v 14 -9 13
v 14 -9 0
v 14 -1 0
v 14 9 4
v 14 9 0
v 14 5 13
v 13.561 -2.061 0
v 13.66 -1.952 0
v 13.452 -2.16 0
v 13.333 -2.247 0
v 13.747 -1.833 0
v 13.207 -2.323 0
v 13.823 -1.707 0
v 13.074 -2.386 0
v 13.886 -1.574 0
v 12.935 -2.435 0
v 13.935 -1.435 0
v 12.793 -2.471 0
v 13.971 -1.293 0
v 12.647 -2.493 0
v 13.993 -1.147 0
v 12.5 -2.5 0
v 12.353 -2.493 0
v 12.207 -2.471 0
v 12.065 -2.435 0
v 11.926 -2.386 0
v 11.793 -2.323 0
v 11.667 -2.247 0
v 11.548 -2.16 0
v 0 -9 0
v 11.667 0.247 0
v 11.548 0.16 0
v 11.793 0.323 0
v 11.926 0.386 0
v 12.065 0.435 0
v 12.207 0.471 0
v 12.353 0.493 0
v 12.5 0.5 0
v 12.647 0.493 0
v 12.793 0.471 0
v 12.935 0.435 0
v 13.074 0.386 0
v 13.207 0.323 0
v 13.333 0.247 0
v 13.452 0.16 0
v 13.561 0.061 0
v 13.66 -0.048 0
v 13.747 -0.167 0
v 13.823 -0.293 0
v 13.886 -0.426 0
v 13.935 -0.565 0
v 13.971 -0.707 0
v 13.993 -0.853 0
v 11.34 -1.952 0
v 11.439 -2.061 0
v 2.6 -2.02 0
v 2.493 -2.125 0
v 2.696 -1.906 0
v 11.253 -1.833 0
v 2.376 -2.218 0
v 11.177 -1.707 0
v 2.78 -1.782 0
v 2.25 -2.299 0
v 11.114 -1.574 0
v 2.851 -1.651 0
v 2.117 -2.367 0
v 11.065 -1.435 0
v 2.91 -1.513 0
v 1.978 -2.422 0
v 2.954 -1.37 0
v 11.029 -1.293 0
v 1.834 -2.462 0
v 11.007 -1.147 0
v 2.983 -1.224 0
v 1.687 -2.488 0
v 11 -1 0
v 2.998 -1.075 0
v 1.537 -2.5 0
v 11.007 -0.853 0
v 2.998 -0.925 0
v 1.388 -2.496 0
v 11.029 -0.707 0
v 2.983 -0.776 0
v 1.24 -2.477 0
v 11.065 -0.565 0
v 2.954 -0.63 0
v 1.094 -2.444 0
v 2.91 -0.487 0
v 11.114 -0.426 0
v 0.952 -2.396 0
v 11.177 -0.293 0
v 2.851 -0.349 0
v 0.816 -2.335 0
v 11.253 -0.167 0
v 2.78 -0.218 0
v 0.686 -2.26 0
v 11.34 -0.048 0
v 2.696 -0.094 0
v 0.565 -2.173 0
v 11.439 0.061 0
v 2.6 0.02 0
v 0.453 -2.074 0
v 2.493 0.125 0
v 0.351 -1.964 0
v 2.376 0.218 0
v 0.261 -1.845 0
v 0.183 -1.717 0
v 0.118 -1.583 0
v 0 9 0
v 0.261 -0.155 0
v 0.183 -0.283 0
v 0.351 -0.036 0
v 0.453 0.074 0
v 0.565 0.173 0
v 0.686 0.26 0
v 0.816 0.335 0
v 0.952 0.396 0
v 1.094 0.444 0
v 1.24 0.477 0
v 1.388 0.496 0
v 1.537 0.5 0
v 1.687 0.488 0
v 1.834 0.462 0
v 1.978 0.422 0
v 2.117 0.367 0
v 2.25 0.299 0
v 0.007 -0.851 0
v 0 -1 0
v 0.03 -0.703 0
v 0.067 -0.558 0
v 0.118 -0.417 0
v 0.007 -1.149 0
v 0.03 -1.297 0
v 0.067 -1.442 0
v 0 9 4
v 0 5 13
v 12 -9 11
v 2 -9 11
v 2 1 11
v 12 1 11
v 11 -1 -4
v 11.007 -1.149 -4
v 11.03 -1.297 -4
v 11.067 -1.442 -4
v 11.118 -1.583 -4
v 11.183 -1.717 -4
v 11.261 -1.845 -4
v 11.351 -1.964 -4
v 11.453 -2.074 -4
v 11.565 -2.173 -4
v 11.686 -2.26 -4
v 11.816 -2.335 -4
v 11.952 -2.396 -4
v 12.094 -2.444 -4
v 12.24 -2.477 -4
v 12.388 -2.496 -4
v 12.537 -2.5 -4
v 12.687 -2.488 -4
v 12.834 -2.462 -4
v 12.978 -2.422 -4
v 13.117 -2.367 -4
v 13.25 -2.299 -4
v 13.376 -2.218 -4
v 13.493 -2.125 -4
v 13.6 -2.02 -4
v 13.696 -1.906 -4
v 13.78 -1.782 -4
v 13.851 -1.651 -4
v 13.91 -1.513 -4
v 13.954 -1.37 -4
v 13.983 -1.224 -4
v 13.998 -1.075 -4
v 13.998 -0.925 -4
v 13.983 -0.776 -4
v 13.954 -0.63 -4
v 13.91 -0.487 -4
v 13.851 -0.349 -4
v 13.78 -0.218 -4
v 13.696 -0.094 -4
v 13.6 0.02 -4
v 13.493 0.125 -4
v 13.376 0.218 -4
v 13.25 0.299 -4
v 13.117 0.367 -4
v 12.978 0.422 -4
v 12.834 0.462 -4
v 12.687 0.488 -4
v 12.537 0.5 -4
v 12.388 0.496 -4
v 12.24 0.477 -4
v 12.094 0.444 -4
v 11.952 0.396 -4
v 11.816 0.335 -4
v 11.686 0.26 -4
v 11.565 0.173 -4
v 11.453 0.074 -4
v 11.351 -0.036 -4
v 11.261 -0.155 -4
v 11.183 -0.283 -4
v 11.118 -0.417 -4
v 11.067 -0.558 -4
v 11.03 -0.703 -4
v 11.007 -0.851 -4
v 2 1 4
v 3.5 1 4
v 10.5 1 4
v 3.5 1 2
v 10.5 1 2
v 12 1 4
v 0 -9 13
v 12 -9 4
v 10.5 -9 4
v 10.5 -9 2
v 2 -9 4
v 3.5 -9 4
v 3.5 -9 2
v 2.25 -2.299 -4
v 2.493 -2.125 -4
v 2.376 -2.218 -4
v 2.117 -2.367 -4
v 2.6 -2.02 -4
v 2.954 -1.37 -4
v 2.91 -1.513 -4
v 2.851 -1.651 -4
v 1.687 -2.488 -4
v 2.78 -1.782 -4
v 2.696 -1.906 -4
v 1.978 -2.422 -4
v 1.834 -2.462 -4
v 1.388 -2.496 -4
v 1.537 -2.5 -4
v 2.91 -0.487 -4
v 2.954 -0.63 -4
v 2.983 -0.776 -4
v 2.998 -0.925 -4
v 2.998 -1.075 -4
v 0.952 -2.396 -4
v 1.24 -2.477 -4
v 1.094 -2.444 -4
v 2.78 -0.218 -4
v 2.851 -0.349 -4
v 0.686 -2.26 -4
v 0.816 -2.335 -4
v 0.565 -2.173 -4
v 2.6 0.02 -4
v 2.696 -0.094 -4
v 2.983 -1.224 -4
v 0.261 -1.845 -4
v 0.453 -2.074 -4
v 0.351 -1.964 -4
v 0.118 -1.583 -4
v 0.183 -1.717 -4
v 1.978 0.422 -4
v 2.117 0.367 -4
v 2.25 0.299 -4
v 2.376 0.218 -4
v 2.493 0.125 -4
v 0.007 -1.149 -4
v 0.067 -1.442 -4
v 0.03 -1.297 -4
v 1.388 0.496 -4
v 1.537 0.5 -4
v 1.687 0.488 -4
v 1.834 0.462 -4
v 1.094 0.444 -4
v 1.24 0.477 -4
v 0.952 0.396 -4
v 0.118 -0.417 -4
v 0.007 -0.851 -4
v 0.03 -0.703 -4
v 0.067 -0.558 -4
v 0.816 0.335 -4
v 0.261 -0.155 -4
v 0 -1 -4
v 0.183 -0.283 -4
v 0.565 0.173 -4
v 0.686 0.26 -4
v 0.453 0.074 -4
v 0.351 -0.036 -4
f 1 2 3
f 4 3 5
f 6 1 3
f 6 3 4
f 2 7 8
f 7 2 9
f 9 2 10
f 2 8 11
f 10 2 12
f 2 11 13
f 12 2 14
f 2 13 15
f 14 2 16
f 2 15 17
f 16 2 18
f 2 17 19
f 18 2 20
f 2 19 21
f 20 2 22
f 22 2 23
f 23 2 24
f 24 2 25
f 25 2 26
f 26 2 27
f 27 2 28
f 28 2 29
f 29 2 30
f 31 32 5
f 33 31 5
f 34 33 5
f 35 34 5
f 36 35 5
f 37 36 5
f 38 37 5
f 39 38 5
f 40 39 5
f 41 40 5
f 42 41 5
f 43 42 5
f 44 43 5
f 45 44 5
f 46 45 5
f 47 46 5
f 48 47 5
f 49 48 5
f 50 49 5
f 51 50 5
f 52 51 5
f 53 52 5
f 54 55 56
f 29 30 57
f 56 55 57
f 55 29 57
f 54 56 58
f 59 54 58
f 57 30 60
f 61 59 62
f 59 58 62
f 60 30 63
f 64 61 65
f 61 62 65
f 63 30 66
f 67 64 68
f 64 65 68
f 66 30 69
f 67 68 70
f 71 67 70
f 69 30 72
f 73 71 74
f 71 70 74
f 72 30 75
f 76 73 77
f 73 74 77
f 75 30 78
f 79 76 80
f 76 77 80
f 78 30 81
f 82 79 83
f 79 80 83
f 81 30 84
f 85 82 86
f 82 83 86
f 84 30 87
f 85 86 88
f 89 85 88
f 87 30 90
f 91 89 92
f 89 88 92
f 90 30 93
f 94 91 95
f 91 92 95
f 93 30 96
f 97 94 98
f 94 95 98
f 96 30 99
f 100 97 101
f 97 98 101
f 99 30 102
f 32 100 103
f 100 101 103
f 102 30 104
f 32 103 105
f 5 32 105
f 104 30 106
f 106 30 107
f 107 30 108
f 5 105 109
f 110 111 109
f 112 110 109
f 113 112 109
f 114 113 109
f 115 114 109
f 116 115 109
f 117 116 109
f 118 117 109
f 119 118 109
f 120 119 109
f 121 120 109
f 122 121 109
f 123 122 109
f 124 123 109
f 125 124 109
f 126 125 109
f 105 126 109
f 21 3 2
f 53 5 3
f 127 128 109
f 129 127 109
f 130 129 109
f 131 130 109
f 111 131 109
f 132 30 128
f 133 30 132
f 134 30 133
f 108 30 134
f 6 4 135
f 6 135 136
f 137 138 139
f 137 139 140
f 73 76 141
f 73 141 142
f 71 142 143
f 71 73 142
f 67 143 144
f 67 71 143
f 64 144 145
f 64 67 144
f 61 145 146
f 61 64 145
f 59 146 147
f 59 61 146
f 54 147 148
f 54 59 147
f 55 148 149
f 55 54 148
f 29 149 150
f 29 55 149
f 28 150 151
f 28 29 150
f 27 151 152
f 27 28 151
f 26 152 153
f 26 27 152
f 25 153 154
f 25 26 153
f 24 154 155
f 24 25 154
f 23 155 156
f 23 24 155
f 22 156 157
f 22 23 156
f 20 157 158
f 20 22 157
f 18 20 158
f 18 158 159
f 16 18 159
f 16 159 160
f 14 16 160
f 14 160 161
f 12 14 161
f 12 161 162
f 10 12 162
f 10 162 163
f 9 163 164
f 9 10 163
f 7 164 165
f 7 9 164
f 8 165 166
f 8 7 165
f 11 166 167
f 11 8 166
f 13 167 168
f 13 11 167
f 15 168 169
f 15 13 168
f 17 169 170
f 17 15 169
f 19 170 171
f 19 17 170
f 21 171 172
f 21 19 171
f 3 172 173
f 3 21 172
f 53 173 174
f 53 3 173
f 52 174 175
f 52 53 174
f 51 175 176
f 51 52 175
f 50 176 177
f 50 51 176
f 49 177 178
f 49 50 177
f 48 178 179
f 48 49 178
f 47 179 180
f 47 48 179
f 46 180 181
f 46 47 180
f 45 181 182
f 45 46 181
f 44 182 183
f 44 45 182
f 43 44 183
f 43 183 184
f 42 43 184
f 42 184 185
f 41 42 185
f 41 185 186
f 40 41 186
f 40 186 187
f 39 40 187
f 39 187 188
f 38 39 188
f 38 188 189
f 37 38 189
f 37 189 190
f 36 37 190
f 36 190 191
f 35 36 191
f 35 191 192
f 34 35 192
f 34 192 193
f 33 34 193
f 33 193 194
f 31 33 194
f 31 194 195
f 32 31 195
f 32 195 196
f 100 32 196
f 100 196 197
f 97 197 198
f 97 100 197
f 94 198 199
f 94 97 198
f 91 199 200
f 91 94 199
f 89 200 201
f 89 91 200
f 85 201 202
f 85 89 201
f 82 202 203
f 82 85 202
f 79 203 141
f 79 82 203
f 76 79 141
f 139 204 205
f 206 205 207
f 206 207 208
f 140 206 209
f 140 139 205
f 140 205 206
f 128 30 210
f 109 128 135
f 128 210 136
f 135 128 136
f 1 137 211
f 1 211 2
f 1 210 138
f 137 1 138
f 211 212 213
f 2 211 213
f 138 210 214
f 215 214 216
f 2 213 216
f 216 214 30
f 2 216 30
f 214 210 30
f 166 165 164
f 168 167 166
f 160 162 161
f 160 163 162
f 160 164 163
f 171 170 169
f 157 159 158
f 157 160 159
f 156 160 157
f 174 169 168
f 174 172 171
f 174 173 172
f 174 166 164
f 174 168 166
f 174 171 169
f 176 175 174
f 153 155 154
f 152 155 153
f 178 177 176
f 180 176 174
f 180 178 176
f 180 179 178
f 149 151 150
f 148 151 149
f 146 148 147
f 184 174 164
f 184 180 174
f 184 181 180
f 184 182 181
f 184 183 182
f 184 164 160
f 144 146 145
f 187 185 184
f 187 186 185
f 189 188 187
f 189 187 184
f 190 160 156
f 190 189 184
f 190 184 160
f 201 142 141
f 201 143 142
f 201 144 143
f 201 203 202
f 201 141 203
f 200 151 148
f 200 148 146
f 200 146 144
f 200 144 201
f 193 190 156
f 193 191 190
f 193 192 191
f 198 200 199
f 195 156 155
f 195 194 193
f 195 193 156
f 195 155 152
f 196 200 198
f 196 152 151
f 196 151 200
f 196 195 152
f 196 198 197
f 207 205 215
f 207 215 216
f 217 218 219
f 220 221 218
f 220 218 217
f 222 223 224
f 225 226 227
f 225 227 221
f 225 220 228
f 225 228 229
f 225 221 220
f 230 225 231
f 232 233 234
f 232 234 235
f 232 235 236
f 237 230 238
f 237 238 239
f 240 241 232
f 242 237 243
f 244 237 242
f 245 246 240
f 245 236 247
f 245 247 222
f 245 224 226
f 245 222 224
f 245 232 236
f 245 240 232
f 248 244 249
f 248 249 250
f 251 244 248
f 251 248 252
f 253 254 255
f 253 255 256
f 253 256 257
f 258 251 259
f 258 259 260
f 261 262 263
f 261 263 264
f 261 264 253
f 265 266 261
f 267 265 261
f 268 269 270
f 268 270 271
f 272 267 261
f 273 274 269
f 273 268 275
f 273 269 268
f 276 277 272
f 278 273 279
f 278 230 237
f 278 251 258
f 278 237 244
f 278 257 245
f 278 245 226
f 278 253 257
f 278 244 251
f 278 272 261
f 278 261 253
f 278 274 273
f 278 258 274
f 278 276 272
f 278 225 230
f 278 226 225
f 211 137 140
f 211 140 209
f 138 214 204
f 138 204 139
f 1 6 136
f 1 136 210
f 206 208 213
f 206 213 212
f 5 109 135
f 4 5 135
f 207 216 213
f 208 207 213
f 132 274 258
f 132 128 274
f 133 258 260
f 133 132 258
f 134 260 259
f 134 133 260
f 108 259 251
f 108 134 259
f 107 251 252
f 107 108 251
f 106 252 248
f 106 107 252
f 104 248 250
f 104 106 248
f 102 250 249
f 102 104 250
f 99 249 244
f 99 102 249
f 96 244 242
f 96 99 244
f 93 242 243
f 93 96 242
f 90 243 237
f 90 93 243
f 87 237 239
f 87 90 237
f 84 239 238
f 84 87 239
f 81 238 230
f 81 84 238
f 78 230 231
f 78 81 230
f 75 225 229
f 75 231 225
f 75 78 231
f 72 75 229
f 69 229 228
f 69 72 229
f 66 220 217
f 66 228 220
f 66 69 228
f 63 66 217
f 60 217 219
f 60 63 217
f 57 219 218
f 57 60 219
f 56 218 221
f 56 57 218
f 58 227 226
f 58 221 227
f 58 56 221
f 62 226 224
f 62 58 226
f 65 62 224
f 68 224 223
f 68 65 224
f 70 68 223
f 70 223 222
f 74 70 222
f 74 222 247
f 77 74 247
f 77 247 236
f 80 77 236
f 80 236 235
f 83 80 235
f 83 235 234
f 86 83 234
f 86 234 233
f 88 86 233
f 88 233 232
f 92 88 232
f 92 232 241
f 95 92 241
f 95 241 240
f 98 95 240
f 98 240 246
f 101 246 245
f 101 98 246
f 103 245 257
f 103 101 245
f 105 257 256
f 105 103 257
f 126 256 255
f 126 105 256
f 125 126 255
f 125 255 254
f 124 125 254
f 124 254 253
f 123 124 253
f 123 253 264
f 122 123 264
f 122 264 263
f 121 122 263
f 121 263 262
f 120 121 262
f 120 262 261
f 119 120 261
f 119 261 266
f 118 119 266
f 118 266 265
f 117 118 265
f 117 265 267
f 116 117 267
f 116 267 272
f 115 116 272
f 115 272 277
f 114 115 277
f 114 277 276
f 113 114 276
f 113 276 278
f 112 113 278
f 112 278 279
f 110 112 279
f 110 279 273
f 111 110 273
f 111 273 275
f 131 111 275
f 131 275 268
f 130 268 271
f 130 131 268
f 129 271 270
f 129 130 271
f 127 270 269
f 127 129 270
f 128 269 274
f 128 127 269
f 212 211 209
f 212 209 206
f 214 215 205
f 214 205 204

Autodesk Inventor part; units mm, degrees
ref_plane "YZ Plane" through (0, 0, 0) normal (1, 0, 0) x (0, 1, 0)
ref_plane "XZ Plane" through (0, 0, 0) normal (0, 1, 0) x (-1, 0, 0)
ref_plane "XY Plane" through (0, 0, 0) normal (0, 0, 1) x (1, 0, 0)
sketch "Sketch1" plane through (0, 0, 0) normal (1, 0, 0) x (0, 1, 0)
  line L0 (-9, 13) -> (-9, 0)
  line L1 (-9, 0) -> (9, 0)
  line L2 (9, 0) -> (9, 4)
  line L3 (9, 4) -> (5, 13)
  line L4 (5, 13) -> (-9, 13)
  point P0 (0, 0)
  dimension "d0" = 13
  dimension "d1" = 18
  dimension "d2" = 9
  dimension "d3" = 0
  dimension "d4" = 4
  dimension "d5" = 14
extrude "Extrusion1" add sketch "Sketch1" along normal blind 14
sketch "Sketch2" plane through (0, -9, 0) normal (0, -1, 0) x (1, 0, 0)
  line L0 (0, 13) -> (0, 0) projected
  line L1 (14, 13) -> (14, 0) projected
  line L2 (0, 13) -> (14, 13) projected
  line L3 (2, 11) -> (12, 11)
  line L4 (12, 11) -> (12, 4)
  line L5 (12, 4) -> (2, 4)
  line L6 (2, 4) -> (2, 11)
  line L7 (3.5, 2) -> (10.5, 2)
  line L8 (10.5, 2) -> (10.5, 4)
  line L9 (10.5, 4) -> (3.5, 4)
  line L10 (3.5, 4) -> (3.5, 2)
  dimension "d8" = 10
  dimension "d9" = 7
  dimension "d10" = 2
  dimension "d11" = 2
  dimension "d12" = 2
  dimension "d13" = 7
  dimension "d14" = 2
  dimension "d15" = 0
  dimension "d16" = 3.5
extrude "Extrusion2" cut sketch "Sketch2" against normal blind 10
sketch "Sketch3" plane through (0, -9, 0) normal (0, 0, -1) x (-1, 0, 0)
  line L0 (0, 0) -> (0, 18) projected
  line L1 (-14, 0) -> (-14, 18) projected
  line L2 (0, 0) -> (-14, 0) projected
  circle A0 centre (-12.5, 8) radius 1.5
  circle A1 centre (-1.5, 8) radius 1.5
  point P0 (0, 9)
  dimension "d19" = 3
  dimension "d20" = 1.5
  dimension "d21" = 1.5
  dimension "d22" = 8
  dimension "d23" = 8
extrude "Extrusion3" add sketch "Sketch3" along normal blind 4
equation "\"d2\" = 0.5 * d1"
equation "\"d11\" = d12"
properties part number "6P6C" material "PC/ABS Plastic"
